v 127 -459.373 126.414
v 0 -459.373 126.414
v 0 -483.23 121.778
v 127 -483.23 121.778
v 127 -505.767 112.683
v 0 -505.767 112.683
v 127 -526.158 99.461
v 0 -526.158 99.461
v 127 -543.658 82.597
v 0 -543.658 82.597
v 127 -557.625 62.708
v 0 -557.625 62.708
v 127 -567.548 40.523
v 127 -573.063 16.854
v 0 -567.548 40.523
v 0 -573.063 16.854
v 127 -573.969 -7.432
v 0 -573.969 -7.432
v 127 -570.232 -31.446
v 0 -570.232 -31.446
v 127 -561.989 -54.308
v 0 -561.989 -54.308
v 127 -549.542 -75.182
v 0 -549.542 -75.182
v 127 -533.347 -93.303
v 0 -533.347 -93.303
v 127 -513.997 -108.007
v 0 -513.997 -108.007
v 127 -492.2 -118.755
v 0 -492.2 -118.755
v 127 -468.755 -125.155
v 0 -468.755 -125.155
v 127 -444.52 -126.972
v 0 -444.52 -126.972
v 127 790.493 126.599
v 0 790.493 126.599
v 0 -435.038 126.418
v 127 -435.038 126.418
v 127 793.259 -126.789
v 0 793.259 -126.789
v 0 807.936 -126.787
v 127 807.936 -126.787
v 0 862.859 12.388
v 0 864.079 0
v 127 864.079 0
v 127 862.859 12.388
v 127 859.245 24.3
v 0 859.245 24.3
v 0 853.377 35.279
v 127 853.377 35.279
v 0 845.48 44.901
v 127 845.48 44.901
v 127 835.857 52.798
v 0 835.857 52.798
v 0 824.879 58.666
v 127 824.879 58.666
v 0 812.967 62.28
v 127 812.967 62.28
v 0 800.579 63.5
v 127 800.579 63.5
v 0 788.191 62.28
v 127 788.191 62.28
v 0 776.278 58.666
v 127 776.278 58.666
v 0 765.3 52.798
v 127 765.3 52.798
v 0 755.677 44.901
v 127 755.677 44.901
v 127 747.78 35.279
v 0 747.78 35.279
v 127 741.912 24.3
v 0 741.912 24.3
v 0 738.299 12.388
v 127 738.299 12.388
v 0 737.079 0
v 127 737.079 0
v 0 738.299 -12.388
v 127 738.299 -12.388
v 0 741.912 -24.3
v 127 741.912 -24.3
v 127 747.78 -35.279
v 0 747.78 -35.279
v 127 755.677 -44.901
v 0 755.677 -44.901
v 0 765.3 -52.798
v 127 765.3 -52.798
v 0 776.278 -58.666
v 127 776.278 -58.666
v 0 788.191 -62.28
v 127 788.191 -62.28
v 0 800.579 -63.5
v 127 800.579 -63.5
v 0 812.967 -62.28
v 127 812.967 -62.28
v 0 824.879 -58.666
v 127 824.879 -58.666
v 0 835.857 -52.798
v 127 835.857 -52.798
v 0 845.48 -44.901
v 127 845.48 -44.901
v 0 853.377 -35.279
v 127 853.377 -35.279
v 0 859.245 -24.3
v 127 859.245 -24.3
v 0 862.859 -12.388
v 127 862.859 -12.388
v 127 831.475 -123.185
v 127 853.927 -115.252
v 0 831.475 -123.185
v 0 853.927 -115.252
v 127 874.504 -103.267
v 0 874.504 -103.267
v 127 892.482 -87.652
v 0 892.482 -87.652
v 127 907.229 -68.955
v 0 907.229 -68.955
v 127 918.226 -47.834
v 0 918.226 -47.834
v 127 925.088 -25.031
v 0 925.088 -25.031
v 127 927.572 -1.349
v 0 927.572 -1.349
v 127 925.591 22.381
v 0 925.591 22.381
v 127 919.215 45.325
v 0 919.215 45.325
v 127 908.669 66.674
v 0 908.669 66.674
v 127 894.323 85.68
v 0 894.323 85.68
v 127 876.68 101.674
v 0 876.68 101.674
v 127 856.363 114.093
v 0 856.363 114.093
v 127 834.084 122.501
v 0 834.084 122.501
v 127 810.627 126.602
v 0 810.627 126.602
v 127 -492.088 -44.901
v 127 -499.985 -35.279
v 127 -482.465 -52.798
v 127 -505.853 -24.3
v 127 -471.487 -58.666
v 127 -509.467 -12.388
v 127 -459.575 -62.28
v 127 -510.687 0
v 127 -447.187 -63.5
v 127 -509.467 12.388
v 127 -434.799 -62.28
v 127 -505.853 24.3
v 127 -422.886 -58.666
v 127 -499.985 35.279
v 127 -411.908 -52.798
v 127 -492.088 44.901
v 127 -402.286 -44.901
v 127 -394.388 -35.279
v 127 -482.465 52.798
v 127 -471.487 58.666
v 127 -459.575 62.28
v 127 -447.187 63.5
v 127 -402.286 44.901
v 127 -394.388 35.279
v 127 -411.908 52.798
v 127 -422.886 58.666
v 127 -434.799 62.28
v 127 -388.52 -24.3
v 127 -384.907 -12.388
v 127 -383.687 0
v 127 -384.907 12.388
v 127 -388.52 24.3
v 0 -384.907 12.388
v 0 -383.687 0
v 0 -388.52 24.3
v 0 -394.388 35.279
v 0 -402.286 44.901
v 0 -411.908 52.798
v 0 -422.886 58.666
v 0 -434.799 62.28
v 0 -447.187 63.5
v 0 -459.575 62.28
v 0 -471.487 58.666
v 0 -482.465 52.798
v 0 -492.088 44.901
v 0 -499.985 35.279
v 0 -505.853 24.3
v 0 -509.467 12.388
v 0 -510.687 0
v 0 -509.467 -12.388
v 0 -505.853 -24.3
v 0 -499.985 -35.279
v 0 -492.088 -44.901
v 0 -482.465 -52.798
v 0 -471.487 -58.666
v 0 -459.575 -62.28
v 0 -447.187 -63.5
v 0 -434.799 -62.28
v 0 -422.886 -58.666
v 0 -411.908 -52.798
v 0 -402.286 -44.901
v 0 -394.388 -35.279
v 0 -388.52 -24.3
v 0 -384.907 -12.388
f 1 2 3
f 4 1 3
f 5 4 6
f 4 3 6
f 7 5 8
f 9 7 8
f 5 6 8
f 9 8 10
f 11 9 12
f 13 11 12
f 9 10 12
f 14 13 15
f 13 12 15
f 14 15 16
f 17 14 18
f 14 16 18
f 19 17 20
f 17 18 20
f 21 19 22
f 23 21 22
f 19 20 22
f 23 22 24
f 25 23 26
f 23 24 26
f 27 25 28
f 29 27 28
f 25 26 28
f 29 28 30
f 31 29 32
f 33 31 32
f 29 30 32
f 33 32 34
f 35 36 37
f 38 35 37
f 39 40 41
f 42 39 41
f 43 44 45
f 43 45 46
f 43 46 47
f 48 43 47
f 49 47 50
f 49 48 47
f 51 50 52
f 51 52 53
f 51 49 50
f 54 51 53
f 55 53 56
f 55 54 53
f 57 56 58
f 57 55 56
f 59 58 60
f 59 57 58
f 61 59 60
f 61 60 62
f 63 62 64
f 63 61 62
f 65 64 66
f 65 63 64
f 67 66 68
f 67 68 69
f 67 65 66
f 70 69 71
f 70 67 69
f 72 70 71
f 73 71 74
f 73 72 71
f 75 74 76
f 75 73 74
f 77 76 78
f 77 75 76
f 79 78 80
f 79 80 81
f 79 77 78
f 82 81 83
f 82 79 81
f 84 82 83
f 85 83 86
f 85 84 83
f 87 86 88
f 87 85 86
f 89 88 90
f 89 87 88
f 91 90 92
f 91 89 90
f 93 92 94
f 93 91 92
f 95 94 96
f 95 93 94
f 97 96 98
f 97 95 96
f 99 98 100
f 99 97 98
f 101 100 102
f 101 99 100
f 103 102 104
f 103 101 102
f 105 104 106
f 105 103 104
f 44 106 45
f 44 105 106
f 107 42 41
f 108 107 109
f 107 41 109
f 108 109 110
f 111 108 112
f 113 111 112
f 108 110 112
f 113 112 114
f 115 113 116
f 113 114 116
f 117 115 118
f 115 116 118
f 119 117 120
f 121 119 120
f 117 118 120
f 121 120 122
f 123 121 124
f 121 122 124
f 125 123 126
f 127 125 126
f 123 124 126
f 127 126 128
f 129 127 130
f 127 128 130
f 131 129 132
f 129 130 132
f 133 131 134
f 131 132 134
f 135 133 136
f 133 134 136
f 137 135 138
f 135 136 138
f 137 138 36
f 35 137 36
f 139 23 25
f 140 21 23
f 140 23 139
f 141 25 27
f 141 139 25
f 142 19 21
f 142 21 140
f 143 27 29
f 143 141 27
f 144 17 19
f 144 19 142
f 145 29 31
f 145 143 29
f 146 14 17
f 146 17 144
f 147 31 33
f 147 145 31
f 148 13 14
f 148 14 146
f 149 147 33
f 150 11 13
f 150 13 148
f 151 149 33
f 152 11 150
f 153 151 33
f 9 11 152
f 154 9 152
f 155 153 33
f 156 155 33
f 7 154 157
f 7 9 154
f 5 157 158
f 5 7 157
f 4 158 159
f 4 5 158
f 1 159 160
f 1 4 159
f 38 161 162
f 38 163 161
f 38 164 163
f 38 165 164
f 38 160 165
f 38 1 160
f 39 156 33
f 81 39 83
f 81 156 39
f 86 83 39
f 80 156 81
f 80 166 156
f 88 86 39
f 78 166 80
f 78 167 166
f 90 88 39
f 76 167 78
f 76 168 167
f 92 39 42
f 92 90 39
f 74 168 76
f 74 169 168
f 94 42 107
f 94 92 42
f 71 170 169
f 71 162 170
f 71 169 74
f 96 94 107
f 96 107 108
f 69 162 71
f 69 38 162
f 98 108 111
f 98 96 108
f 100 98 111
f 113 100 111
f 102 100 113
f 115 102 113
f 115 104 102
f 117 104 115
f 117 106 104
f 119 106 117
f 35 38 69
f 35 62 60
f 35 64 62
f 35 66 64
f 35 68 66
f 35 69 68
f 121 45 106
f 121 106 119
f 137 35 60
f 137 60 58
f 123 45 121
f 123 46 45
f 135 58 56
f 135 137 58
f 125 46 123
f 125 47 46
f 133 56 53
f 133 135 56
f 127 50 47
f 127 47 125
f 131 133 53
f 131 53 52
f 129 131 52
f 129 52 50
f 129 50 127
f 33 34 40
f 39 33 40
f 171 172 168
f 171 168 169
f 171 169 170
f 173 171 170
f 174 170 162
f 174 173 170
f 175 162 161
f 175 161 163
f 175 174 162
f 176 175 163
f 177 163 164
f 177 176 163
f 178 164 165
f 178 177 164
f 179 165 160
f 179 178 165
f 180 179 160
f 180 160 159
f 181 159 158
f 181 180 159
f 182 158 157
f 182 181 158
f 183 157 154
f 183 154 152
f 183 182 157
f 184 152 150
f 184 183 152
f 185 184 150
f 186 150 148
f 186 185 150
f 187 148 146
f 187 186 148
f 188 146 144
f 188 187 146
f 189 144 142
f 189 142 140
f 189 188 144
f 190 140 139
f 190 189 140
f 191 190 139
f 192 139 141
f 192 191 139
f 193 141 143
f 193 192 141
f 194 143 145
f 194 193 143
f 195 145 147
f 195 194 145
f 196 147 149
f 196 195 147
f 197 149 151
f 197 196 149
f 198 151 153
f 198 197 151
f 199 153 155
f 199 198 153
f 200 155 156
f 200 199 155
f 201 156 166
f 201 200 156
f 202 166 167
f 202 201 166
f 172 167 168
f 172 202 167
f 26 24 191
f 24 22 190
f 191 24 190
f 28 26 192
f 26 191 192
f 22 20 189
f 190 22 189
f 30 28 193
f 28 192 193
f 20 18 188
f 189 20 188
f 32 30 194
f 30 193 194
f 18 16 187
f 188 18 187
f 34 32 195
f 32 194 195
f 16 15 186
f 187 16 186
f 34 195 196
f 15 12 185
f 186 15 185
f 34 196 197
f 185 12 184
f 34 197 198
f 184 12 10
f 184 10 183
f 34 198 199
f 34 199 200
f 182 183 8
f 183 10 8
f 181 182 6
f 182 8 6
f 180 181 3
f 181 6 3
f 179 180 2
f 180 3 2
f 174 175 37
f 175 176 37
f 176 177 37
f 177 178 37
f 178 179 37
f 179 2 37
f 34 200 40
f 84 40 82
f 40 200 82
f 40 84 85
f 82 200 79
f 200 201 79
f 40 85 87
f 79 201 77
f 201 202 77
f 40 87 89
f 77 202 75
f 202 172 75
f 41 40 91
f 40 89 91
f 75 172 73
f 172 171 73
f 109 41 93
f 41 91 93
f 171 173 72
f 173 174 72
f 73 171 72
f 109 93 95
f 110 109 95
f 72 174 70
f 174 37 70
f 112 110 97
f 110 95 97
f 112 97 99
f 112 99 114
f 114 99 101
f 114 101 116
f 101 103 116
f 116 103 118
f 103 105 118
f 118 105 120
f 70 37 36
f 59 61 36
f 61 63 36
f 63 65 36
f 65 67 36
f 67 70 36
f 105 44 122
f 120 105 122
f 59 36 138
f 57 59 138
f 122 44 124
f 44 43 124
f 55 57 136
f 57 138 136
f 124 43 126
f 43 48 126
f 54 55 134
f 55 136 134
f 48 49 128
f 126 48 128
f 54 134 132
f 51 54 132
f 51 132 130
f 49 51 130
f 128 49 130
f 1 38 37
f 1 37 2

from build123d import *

# Parameters (mm, degrees)
F0_R     = 63.5
F1_DEPTH = 127


with BuildPart() as f1:
    # F0 (on Right) → F1 (new body)
    with BuildSketch(Plane.YZ):
        with BuildLine():
            Line((790.493007, 126.598885), (-435.038035, 126.417593))
            Line((-435.038035, 126.417593), (-459.372944, 126.413993))
            ThreePointArc((-459.372944, 126.413993), (-573.96915, -7.43188), (-444.519662, -126.971991))
            Line((-444.519662, -126.971991), (793.259037, -126.788887))
            Line((793.259037, -126.788887), (807.935979, -126.786715))
            ThreePointArc((807.935979, -126.786715), (927.571591, -1.348702), (810.627042, 126.601864))
            Line((810.627042, 126.601864), (790.493007, 126.598885))
        make_face()
        with Locations((-447.186789, 0)):
            Circle(F0_R, mode=Mode.SUBTRACT)
        with Locations((800.578752, 0)):
            Circle(F0_R, mode=Mode.SUBTRACT)
    extrude(amount=F1_DEPTH)


solid = f1.part
